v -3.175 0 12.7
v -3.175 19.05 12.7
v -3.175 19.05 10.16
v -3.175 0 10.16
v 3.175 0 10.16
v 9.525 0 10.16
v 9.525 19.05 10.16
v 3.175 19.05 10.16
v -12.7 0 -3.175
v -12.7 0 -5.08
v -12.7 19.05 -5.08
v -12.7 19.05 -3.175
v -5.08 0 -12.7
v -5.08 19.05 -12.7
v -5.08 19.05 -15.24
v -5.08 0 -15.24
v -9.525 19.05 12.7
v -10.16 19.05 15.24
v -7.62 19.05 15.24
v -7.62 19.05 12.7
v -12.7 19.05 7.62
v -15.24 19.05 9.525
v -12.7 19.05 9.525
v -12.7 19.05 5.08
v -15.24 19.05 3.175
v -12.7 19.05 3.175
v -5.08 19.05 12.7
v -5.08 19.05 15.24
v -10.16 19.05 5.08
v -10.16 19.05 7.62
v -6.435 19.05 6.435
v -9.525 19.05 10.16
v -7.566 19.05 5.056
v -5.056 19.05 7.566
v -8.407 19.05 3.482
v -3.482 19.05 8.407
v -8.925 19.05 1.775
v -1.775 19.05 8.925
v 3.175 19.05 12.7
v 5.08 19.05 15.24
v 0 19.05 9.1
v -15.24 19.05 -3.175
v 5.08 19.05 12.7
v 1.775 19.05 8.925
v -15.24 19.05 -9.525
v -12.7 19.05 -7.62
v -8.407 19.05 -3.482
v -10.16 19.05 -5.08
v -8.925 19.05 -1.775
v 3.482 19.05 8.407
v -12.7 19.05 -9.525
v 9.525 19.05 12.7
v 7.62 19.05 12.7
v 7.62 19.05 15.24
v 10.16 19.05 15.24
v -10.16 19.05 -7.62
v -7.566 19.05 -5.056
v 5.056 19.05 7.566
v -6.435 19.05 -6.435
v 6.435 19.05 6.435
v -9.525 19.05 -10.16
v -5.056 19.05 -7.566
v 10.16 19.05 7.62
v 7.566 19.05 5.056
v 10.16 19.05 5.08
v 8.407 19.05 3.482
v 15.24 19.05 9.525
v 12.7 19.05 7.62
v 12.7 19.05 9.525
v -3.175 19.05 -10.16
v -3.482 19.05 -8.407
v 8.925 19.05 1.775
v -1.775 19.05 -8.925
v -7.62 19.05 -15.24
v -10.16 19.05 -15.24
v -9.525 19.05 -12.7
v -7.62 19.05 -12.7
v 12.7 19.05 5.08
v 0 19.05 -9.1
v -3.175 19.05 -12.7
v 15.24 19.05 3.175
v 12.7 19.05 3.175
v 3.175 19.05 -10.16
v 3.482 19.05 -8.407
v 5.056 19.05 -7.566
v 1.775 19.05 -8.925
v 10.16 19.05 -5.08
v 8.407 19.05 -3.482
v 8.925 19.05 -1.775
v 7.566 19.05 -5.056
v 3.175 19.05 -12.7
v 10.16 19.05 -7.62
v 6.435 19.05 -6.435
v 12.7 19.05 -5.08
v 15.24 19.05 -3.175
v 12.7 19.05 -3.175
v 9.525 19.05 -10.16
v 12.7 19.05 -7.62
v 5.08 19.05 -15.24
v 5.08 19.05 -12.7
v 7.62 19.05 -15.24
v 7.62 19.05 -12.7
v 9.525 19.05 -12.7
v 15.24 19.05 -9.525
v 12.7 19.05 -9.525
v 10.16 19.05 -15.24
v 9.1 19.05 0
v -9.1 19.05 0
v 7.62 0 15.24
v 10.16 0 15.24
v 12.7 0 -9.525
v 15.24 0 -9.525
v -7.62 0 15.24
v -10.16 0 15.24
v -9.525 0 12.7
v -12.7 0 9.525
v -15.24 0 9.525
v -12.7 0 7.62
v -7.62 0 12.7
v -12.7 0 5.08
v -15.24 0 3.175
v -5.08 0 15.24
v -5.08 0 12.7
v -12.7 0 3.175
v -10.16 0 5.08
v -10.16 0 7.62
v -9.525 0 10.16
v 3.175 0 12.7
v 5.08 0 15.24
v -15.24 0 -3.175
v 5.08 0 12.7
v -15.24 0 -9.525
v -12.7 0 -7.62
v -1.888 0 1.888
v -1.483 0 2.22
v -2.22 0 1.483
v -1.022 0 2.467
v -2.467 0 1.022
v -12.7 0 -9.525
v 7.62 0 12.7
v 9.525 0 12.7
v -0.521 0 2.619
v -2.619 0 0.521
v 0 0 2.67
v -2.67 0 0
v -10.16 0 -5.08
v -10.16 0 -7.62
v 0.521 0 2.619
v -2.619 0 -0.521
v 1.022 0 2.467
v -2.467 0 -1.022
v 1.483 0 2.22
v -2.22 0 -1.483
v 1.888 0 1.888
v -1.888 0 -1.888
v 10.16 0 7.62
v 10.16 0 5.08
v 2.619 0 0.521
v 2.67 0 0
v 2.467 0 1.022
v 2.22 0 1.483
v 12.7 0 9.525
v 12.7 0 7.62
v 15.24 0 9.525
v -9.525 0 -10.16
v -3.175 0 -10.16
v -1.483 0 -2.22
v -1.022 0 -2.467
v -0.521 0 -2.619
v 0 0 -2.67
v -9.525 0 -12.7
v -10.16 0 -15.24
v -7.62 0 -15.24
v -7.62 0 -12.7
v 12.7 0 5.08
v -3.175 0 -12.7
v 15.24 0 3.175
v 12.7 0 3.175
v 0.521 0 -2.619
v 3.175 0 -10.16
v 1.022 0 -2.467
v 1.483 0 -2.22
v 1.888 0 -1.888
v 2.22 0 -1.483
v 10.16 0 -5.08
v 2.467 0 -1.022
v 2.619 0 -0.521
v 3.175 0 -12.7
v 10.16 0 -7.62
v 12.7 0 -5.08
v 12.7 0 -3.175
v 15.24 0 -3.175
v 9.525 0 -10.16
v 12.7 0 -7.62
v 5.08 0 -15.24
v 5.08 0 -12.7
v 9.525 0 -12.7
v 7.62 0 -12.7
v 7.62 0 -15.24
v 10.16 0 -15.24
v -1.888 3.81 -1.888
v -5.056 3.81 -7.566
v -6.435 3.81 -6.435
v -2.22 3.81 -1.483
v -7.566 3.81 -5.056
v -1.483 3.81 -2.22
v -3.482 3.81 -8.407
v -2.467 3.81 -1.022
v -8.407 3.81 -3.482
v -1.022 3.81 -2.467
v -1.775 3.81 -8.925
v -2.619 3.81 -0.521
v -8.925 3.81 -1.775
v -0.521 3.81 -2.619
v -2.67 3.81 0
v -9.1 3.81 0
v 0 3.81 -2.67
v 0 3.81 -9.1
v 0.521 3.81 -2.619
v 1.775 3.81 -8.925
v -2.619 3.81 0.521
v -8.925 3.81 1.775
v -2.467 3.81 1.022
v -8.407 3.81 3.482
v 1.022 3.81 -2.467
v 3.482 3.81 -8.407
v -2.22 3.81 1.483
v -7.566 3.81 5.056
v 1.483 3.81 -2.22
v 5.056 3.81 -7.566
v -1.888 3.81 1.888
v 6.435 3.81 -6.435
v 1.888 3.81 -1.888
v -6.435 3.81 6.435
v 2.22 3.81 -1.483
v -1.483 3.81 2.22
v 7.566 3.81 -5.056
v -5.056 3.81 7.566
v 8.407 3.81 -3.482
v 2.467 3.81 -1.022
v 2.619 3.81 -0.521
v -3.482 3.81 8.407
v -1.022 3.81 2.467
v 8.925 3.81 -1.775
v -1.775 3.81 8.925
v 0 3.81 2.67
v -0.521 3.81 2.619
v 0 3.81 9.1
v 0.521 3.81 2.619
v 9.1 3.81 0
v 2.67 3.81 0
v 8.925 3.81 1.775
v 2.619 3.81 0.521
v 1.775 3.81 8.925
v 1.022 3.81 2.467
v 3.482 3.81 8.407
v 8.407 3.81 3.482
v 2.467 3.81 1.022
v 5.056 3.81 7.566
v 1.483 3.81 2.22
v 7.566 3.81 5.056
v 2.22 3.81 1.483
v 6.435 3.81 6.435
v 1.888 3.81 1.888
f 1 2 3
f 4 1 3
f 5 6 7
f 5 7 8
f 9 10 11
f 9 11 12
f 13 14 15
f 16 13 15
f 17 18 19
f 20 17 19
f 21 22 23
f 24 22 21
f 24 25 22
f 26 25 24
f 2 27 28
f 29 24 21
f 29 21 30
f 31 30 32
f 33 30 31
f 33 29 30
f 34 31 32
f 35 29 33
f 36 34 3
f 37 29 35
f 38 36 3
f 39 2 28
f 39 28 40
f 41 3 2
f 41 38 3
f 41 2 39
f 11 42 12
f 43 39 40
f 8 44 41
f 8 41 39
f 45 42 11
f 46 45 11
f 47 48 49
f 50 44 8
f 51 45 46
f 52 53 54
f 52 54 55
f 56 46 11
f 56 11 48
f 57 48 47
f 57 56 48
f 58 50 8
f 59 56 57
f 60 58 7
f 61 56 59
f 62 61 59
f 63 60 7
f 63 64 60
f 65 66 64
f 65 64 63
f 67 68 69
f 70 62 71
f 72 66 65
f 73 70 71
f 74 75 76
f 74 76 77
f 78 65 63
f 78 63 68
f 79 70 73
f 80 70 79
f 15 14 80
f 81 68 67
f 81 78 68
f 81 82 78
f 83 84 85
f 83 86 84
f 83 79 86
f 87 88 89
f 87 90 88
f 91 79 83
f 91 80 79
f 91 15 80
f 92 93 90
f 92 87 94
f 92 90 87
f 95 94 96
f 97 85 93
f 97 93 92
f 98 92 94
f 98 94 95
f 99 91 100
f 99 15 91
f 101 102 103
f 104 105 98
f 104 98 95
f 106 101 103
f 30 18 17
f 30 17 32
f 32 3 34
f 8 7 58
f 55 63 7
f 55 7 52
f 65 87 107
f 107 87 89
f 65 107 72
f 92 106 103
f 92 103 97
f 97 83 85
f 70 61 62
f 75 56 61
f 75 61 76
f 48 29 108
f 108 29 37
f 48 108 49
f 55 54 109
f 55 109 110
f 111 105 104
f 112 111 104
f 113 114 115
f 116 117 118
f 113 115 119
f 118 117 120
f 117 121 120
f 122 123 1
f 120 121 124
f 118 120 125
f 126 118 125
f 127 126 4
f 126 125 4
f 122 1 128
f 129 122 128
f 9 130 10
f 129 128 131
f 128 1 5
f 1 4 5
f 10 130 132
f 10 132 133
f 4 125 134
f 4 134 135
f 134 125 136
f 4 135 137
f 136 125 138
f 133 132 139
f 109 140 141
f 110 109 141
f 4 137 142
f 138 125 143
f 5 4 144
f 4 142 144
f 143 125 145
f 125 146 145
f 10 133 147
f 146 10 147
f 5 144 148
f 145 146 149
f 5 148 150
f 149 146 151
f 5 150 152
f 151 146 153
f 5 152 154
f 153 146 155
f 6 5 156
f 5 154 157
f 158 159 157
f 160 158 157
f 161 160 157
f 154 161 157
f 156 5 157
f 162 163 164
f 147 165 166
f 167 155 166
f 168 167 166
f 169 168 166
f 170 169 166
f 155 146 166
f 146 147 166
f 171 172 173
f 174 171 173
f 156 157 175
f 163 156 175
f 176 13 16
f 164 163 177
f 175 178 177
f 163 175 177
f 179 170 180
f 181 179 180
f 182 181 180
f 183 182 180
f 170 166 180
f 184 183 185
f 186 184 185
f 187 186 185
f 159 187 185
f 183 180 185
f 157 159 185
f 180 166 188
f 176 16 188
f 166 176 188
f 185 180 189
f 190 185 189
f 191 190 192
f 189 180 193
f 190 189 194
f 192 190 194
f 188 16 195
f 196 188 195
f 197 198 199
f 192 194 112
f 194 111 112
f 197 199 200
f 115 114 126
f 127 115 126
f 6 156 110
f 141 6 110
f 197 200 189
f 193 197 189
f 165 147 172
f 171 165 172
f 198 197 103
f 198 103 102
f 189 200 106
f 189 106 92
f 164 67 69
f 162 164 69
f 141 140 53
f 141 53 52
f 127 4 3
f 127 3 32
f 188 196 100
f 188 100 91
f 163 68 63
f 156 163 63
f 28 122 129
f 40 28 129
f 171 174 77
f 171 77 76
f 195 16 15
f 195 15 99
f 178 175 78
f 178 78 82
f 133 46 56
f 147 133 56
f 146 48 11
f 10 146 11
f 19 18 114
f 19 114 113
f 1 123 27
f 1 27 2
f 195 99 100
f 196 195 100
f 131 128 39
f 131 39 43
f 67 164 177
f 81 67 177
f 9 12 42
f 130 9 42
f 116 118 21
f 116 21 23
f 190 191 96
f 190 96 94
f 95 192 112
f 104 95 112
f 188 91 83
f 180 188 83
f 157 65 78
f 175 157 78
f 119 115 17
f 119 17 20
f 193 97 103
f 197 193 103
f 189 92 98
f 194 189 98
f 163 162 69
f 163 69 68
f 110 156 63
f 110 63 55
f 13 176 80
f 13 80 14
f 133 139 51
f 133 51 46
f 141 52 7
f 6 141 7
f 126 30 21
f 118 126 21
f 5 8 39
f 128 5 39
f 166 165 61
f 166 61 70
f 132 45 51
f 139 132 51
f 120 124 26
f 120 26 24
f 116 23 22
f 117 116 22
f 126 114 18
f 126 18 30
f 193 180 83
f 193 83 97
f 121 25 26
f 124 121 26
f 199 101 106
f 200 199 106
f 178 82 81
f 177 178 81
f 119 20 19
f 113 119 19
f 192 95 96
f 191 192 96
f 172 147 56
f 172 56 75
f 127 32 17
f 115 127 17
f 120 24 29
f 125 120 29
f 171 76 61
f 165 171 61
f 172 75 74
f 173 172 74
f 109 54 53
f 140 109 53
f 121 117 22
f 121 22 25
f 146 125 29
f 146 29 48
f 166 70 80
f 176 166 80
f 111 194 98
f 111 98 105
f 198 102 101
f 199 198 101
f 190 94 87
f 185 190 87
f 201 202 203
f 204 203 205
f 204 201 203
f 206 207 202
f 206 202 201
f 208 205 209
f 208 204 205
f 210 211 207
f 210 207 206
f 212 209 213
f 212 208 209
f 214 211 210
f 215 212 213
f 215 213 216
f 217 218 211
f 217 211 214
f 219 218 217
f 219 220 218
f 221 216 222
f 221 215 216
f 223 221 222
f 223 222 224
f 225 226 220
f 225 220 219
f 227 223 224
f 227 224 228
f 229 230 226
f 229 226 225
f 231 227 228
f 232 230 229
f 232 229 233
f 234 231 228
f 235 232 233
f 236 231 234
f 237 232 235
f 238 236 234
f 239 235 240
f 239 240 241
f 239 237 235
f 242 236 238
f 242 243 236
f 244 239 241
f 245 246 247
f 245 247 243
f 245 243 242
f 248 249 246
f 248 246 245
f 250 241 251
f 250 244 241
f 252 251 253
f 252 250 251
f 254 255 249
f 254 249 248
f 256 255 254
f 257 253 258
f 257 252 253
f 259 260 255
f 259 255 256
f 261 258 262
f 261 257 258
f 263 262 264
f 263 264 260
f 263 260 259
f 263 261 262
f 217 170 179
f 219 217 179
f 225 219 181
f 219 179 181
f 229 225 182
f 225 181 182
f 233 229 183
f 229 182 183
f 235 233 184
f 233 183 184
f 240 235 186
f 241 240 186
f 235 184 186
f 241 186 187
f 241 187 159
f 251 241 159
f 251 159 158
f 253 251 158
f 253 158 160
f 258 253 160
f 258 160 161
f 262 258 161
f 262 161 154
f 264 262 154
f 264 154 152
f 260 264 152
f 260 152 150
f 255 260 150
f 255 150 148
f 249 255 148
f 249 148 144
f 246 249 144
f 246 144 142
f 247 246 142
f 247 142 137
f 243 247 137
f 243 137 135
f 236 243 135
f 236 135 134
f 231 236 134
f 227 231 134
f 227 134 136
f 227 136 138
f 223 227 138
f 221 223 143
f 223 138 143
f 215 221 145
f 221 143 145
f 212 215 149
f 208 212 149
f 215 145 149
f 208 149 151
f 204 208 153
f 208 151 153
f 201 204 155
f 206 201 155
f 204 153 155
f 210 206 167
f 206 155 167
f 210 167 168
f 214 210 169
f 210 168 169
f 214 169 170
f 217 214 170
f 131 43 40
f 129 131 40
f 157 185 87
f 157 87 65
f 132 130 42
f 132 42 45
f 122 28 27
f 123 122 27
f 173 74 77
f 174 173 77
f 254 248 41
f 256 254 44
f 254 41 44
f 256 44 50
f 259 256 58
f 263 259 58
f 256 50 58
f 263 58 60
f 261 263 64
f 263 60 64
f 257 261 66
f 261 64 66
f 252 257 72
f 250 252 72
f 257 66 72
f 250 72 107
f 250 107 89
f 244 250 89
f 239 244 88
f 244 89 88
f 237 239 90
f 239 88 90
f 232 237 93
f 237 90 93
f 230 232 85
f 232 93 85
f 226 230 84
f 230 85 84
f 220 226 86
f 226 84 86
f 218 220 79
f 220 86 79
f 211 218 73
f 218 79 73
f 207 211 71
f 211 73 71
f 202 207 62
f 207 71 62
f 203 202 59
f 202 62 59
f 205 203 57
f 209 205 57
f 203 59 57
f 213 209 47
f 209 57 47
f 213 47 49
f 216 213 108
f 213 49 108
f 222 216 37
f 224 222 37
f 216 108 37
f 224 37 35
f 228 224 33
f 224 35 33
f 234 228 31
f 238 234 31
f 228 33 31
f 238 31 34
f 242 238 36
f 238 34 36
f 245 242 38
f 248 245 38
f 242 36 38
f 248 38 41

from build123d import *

# Parameters (mm, degrees)
SKETCH1_W               = 30.48
SKETCH1_H               = 30.48
BOSS_EXTRUDE1_DEPTH     = 19.05
SKETCH4_R               = 9.1
CUT_EXTRUDE1_DEPTH      = 15.24
CUT_EXTRUDE2_REACH      = 30.765
SKETCH5_R               = 2.669997608
CUT_EXTRUDE3_DEPTH      = 29.764869198
CUT_EXTRUDE3_DEPTH_BACK = 19.05
SKETCH6_OUTSIDE_W       = 41.906
SKETCH6_OUTSIDE_H       = 41.906


with BuildPart() as part:
    # Sketch1 → Boss-Extrude1 (new body)
    with BuildSketch(Plane(origin=(0, 0, 0), x_dir=(1, 0, 0), z_dir=(0, 1, 0))):
        Rectangle(SKETCH1_W, SKETCH1_H)
    extrude(amount=BOSS_EXTRUDE1_DEPTH)

    # Sketch4 → Cut-Extrude1 (cut)
    with BuildSketch(Plane(origin=(0, 19.05, 0), x_dir=(1, 0, 0), z_dir=(0, 1, 0))):
        with Locations(Location((0, 0, 0), (0, 0, 270))):
            Circle(SKETCH4_R)
    extrude(amount=-CUT_EXTRUDE1_DEPTH, mode=Mode.SUBTRACT)

    # Sketch5 → Cut-Extrude2 (cut, up to next)
    with BuildSketch(Plane.XZ, mode=Mode.PRIVATE) as cut_extrude2_sk1:
        with Locations(Location((0, 0, 0), (0, 0, 270))):
            Circle(SKETCH5_R)
    cut_extrude2_tool1 = extrude(cut_extrude2_sk1.sketch, amount=-CUT_EXTRUDE2_REACH, mode=Mode.PRIVATE) & part.part
    add(cut_extrude2_tool1.solids().sort_by_distance((0, 0, 0))[0], mode=Mode.SUBTRACT)

    # Sketch6 outside → Cut-Extrude3 (cut, two sides: drawn at the far end of the back side and taken through both)
    with BuildSketch(Plane(origin=(0, 19.05, 0), x_dir=(1, 0, 0), z_dir=(0, 1, 0)).offset(-CUT_EXTRUDE3_DEPTH_BACK)):
        Rectangle(SKETCH6_OUTSIDE_W, SKETCH6_OUTSIDE_H)
        Polygon((-7.62, 15.24), (-7.62, 12.7), (-9.525, 12.7), (-9.525, 10.16), (-3.175, 10.16), (-3.175, 12.7), (-5.08, 12.7), (-5.08, 15.24), (5.08, 15.24), (5.08, 12.7), (3.175, 12.7), (3.175, 10.16), (9.525, 10.16), (9.525, 12.7), (7.62, 12.7), (7.62, 15.24), (10.16, 15.24), (10.16, 7.62), (12.7, 7.62), (12.7, 9.525), (15.24, 9.525), (15.24, 3.175), (12.7, 3.175), (12.7, 5.08), (10.16, 5.08), (10.16, -5.08), (12.7, -5.08), (12.7, -3.175), (15.24, -3.175), (15.24, -9.525), (12.7, -9.525), (12.7, -7.62), (10.16, -7.62), (10.16, -15.24), (7.62, -15.24), (7.62, -12.7), (9.525, -12.7), (9.525, -10.16), (3.175, -10.16), (3.175, -12.7), (5.08, -12.7), (5.08, -15.24), (-5.08, -15.24), (-5.08, -12.7), (-3.175, -12.7), (-3.175, -10.16), (-9.525, -10.16), (-9.525, -12.7), (-7.62, -12.7), (-7.62, -15.24), (-10.16, -15.24), (-10.16, -7.62), (-12.7, -7.62), (-12.7, -9.525), (-15.24, -9.525), (-15.24, -3.175), (-12.7, -3.175), (-12.7, -5.08), (-10.16, -5.08), (-10.16, 5.08), (-12.7, 5.08), (-12.7, 3.175), (-15.24, 3.175), (-15.24, 9.525), (-12.7, 9.525), (-12.7, 7.62), (-10.16, 7.62), (-10.16, 15.24), align=None, mode=Mode.SUBTRACT)
    extrude(amount=CUT_EXTRUDE3_DEPTH + CUT_EXTRUDE3_DEPTH_BACK, mode=Mode.SUBTRACT)


solid = part.part
